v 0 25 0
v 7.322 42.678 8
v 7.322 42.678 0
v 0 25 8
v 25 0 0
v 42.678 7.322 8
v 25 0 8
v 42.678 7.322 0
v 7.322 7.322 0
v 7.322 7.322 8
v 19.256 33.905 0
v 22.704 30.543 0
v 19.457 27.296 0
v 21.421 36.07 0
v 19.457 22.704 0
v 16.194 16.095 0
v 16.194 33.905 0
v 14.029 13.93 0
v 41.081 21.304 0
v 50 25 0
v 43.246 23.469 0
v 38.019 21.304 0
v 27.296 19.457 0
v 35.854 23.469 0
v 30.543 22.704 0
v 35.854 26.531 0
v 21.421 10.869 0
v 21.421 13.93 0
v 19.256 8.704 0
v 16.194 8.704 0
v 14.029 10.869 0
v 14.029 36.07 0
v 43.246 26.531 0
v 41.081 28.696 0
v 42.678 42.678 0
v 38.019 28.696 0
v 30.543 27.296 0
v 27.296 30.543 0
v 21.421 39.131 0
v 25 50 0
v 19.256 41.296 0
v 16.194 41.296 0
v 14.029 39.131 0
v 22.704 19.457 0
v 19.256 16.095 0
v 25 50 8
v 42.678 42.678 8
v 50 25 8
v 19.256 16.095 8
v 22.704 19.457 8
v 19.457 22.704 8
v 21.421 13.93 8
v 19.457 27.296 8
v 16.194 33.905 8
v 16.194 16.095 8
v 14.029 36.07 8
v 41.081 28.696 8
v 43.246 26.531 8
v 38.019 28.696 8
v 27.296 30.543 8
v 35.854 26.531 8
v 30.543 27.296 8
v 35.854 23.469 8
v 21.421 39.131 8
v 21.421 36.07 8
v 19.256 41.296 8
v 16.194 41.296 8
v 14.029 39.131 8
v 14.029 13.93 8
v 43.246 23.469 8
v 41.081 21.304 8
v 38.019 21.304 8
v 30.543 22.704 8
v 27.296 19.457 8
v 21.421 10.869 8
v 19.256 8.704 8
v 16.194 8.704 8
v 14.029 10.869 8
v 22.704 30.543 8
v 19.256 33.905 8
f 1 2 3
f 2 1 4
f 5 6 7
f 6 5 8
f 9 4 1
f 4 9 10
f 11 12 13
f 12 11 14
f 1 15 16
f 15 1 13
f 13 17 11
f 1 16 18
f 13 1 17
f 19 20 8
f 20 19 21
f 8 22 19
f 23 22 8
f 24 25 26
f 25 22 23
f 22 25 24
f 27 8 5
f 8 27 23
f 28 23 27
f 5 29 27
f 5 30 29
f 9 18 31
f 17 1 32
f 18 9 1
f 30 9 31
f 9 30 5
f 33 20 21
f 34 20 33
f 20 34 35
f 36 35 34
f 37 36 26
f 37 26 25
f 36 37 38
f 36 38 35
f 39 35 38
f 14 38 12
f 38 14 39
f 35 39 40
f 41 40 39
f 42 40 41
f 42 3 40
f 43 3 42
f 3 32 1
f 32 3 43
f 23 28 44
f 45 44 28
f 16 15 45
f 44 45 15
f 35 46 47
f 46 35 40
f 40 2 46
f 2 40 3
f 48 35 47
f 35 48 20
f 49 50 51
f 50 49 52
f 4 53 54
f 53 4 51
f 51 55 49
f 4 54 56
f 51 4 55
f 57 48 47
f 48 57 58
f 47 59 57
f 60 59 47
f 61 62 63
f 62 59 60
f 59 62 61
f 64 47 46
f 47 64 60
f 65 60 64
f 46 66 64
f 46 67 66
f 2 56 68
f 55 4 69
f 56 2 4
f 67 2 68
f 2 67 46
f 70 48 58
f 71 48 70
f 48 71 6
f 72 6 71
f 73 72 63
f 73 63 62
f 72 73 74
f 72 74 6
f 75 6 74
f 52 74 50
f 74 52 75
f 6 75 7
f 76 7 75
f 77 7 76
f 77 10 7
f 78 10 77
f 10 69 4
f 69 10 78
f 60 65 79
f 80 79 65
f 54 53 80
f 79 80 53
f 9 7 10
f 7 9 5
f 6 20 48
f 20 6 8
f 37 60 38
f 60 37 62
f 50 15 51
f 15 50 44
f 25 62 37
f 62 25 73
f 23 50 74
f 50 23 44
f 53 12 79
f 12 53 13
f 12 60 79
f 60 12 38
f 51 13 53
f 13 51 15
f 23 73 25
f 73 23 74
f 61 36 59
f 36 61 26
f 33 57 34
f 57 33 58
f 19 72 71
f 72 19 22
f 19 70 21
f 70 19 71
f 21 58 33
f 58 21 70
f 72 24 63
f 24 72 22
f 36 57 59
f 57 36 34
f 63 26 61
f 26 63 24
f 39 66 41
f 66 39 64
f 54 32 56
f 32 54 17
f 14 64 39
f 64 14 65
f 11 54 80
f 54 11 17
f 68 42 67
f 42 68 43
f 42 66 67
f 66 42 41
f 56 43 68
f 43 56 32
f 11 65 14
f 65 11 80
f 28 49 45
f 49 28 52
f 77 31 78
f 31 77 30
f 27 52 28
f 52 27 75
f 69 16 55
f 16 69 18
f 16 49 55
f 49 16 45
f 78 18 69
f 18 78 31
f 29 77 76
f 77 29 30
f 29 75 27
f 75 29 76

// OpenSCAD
$fn = 32;

// ----------------------------------------------------------------------
// Polygon plate: 8-gon R25, 3 bolt windows
// ----------------------------------------------------------------------

// --- parameters (mm) ---
sides = 8;                // number of polygon sides
plate_r = 25;             // circumscribed radius of the polygon
bore_r = 6;               // centre bore radius
bolts = 3;                // number of bolt windows
ring_r = 14.55;           // bolt-circle radius
bolt_r = 4;               // bolt window radius
plate_t = 8;              // plate thickness, Z (extrusion height)

plate_d = 2 * plate_r;  // circumscribed diameter
bore_d = 2 * bore_r;  // centre bore diameter
bolt_d = 2 * bolt_r;  // bolt window diameter
ring_d = 2 * ring_r;  // bolt-circle diameter

profile = [[50, 25], [42.678, 42.678], [25, 50], [7.322, 42.678], [0, 25], [7.322, 7.322], [25, 0], [42.678, 7.322]];  // primary outline, 8 points, counter clockwise
void_1 = [[30.543, 27.296], [27.296, 30.543], [22.704, 30.543], [19.457, 27.296], [19.457, 22.704], [22.704, 19.457], [27.296, 19.457], [30.543, 22.704]];  // centre bore, 8 points
void_2 = [[43.246, 26.531], [41.081, 28.696], [38.019, 28.696], [35.854, 26.531], [35.854, 23.469], [38.019, 21.304], [41.081, 21.304], [43.246, 23.469]];  // bolt window 1, 8 points
void_3 = [[21.421, 39.131], [19.256, 41.296], [16.194, 41.296], [14.029, 39.131], [14.029, 36.07], [16.194, 33.905], [19.256, 33.905], [21.421, 36.07]];  // bolt window 2, 8 points
void_4 = [[21.421, 13.93], [19.256, 16.095], [16.194, 16.095], [14.029, 13.93], [14.029, 10.869], [16.194, 8.704], [19.256, 8.704], [21.421, 10.869]];  // bolt window 3, 8 points

// --- the one profile operation ---
difference() {
  linear_extrude(height = plate_t) polygon(points = profile);
  translate([0, 0, -1])
    linear_extrude(height = plate_t + 2) polygon(points = void_1);
  translate([0, 0, -1])
    linear_extrude(height = plate_t + 2) polygon(points = void_2);
  translate([0, 0, -1])
    linear_extrude(height = plate_t + 2) polygon(points = void_3);
  translate([0, 0, -1])
    linear_extrude(height = plate_t + 2) polygon(points = void_4);
}
